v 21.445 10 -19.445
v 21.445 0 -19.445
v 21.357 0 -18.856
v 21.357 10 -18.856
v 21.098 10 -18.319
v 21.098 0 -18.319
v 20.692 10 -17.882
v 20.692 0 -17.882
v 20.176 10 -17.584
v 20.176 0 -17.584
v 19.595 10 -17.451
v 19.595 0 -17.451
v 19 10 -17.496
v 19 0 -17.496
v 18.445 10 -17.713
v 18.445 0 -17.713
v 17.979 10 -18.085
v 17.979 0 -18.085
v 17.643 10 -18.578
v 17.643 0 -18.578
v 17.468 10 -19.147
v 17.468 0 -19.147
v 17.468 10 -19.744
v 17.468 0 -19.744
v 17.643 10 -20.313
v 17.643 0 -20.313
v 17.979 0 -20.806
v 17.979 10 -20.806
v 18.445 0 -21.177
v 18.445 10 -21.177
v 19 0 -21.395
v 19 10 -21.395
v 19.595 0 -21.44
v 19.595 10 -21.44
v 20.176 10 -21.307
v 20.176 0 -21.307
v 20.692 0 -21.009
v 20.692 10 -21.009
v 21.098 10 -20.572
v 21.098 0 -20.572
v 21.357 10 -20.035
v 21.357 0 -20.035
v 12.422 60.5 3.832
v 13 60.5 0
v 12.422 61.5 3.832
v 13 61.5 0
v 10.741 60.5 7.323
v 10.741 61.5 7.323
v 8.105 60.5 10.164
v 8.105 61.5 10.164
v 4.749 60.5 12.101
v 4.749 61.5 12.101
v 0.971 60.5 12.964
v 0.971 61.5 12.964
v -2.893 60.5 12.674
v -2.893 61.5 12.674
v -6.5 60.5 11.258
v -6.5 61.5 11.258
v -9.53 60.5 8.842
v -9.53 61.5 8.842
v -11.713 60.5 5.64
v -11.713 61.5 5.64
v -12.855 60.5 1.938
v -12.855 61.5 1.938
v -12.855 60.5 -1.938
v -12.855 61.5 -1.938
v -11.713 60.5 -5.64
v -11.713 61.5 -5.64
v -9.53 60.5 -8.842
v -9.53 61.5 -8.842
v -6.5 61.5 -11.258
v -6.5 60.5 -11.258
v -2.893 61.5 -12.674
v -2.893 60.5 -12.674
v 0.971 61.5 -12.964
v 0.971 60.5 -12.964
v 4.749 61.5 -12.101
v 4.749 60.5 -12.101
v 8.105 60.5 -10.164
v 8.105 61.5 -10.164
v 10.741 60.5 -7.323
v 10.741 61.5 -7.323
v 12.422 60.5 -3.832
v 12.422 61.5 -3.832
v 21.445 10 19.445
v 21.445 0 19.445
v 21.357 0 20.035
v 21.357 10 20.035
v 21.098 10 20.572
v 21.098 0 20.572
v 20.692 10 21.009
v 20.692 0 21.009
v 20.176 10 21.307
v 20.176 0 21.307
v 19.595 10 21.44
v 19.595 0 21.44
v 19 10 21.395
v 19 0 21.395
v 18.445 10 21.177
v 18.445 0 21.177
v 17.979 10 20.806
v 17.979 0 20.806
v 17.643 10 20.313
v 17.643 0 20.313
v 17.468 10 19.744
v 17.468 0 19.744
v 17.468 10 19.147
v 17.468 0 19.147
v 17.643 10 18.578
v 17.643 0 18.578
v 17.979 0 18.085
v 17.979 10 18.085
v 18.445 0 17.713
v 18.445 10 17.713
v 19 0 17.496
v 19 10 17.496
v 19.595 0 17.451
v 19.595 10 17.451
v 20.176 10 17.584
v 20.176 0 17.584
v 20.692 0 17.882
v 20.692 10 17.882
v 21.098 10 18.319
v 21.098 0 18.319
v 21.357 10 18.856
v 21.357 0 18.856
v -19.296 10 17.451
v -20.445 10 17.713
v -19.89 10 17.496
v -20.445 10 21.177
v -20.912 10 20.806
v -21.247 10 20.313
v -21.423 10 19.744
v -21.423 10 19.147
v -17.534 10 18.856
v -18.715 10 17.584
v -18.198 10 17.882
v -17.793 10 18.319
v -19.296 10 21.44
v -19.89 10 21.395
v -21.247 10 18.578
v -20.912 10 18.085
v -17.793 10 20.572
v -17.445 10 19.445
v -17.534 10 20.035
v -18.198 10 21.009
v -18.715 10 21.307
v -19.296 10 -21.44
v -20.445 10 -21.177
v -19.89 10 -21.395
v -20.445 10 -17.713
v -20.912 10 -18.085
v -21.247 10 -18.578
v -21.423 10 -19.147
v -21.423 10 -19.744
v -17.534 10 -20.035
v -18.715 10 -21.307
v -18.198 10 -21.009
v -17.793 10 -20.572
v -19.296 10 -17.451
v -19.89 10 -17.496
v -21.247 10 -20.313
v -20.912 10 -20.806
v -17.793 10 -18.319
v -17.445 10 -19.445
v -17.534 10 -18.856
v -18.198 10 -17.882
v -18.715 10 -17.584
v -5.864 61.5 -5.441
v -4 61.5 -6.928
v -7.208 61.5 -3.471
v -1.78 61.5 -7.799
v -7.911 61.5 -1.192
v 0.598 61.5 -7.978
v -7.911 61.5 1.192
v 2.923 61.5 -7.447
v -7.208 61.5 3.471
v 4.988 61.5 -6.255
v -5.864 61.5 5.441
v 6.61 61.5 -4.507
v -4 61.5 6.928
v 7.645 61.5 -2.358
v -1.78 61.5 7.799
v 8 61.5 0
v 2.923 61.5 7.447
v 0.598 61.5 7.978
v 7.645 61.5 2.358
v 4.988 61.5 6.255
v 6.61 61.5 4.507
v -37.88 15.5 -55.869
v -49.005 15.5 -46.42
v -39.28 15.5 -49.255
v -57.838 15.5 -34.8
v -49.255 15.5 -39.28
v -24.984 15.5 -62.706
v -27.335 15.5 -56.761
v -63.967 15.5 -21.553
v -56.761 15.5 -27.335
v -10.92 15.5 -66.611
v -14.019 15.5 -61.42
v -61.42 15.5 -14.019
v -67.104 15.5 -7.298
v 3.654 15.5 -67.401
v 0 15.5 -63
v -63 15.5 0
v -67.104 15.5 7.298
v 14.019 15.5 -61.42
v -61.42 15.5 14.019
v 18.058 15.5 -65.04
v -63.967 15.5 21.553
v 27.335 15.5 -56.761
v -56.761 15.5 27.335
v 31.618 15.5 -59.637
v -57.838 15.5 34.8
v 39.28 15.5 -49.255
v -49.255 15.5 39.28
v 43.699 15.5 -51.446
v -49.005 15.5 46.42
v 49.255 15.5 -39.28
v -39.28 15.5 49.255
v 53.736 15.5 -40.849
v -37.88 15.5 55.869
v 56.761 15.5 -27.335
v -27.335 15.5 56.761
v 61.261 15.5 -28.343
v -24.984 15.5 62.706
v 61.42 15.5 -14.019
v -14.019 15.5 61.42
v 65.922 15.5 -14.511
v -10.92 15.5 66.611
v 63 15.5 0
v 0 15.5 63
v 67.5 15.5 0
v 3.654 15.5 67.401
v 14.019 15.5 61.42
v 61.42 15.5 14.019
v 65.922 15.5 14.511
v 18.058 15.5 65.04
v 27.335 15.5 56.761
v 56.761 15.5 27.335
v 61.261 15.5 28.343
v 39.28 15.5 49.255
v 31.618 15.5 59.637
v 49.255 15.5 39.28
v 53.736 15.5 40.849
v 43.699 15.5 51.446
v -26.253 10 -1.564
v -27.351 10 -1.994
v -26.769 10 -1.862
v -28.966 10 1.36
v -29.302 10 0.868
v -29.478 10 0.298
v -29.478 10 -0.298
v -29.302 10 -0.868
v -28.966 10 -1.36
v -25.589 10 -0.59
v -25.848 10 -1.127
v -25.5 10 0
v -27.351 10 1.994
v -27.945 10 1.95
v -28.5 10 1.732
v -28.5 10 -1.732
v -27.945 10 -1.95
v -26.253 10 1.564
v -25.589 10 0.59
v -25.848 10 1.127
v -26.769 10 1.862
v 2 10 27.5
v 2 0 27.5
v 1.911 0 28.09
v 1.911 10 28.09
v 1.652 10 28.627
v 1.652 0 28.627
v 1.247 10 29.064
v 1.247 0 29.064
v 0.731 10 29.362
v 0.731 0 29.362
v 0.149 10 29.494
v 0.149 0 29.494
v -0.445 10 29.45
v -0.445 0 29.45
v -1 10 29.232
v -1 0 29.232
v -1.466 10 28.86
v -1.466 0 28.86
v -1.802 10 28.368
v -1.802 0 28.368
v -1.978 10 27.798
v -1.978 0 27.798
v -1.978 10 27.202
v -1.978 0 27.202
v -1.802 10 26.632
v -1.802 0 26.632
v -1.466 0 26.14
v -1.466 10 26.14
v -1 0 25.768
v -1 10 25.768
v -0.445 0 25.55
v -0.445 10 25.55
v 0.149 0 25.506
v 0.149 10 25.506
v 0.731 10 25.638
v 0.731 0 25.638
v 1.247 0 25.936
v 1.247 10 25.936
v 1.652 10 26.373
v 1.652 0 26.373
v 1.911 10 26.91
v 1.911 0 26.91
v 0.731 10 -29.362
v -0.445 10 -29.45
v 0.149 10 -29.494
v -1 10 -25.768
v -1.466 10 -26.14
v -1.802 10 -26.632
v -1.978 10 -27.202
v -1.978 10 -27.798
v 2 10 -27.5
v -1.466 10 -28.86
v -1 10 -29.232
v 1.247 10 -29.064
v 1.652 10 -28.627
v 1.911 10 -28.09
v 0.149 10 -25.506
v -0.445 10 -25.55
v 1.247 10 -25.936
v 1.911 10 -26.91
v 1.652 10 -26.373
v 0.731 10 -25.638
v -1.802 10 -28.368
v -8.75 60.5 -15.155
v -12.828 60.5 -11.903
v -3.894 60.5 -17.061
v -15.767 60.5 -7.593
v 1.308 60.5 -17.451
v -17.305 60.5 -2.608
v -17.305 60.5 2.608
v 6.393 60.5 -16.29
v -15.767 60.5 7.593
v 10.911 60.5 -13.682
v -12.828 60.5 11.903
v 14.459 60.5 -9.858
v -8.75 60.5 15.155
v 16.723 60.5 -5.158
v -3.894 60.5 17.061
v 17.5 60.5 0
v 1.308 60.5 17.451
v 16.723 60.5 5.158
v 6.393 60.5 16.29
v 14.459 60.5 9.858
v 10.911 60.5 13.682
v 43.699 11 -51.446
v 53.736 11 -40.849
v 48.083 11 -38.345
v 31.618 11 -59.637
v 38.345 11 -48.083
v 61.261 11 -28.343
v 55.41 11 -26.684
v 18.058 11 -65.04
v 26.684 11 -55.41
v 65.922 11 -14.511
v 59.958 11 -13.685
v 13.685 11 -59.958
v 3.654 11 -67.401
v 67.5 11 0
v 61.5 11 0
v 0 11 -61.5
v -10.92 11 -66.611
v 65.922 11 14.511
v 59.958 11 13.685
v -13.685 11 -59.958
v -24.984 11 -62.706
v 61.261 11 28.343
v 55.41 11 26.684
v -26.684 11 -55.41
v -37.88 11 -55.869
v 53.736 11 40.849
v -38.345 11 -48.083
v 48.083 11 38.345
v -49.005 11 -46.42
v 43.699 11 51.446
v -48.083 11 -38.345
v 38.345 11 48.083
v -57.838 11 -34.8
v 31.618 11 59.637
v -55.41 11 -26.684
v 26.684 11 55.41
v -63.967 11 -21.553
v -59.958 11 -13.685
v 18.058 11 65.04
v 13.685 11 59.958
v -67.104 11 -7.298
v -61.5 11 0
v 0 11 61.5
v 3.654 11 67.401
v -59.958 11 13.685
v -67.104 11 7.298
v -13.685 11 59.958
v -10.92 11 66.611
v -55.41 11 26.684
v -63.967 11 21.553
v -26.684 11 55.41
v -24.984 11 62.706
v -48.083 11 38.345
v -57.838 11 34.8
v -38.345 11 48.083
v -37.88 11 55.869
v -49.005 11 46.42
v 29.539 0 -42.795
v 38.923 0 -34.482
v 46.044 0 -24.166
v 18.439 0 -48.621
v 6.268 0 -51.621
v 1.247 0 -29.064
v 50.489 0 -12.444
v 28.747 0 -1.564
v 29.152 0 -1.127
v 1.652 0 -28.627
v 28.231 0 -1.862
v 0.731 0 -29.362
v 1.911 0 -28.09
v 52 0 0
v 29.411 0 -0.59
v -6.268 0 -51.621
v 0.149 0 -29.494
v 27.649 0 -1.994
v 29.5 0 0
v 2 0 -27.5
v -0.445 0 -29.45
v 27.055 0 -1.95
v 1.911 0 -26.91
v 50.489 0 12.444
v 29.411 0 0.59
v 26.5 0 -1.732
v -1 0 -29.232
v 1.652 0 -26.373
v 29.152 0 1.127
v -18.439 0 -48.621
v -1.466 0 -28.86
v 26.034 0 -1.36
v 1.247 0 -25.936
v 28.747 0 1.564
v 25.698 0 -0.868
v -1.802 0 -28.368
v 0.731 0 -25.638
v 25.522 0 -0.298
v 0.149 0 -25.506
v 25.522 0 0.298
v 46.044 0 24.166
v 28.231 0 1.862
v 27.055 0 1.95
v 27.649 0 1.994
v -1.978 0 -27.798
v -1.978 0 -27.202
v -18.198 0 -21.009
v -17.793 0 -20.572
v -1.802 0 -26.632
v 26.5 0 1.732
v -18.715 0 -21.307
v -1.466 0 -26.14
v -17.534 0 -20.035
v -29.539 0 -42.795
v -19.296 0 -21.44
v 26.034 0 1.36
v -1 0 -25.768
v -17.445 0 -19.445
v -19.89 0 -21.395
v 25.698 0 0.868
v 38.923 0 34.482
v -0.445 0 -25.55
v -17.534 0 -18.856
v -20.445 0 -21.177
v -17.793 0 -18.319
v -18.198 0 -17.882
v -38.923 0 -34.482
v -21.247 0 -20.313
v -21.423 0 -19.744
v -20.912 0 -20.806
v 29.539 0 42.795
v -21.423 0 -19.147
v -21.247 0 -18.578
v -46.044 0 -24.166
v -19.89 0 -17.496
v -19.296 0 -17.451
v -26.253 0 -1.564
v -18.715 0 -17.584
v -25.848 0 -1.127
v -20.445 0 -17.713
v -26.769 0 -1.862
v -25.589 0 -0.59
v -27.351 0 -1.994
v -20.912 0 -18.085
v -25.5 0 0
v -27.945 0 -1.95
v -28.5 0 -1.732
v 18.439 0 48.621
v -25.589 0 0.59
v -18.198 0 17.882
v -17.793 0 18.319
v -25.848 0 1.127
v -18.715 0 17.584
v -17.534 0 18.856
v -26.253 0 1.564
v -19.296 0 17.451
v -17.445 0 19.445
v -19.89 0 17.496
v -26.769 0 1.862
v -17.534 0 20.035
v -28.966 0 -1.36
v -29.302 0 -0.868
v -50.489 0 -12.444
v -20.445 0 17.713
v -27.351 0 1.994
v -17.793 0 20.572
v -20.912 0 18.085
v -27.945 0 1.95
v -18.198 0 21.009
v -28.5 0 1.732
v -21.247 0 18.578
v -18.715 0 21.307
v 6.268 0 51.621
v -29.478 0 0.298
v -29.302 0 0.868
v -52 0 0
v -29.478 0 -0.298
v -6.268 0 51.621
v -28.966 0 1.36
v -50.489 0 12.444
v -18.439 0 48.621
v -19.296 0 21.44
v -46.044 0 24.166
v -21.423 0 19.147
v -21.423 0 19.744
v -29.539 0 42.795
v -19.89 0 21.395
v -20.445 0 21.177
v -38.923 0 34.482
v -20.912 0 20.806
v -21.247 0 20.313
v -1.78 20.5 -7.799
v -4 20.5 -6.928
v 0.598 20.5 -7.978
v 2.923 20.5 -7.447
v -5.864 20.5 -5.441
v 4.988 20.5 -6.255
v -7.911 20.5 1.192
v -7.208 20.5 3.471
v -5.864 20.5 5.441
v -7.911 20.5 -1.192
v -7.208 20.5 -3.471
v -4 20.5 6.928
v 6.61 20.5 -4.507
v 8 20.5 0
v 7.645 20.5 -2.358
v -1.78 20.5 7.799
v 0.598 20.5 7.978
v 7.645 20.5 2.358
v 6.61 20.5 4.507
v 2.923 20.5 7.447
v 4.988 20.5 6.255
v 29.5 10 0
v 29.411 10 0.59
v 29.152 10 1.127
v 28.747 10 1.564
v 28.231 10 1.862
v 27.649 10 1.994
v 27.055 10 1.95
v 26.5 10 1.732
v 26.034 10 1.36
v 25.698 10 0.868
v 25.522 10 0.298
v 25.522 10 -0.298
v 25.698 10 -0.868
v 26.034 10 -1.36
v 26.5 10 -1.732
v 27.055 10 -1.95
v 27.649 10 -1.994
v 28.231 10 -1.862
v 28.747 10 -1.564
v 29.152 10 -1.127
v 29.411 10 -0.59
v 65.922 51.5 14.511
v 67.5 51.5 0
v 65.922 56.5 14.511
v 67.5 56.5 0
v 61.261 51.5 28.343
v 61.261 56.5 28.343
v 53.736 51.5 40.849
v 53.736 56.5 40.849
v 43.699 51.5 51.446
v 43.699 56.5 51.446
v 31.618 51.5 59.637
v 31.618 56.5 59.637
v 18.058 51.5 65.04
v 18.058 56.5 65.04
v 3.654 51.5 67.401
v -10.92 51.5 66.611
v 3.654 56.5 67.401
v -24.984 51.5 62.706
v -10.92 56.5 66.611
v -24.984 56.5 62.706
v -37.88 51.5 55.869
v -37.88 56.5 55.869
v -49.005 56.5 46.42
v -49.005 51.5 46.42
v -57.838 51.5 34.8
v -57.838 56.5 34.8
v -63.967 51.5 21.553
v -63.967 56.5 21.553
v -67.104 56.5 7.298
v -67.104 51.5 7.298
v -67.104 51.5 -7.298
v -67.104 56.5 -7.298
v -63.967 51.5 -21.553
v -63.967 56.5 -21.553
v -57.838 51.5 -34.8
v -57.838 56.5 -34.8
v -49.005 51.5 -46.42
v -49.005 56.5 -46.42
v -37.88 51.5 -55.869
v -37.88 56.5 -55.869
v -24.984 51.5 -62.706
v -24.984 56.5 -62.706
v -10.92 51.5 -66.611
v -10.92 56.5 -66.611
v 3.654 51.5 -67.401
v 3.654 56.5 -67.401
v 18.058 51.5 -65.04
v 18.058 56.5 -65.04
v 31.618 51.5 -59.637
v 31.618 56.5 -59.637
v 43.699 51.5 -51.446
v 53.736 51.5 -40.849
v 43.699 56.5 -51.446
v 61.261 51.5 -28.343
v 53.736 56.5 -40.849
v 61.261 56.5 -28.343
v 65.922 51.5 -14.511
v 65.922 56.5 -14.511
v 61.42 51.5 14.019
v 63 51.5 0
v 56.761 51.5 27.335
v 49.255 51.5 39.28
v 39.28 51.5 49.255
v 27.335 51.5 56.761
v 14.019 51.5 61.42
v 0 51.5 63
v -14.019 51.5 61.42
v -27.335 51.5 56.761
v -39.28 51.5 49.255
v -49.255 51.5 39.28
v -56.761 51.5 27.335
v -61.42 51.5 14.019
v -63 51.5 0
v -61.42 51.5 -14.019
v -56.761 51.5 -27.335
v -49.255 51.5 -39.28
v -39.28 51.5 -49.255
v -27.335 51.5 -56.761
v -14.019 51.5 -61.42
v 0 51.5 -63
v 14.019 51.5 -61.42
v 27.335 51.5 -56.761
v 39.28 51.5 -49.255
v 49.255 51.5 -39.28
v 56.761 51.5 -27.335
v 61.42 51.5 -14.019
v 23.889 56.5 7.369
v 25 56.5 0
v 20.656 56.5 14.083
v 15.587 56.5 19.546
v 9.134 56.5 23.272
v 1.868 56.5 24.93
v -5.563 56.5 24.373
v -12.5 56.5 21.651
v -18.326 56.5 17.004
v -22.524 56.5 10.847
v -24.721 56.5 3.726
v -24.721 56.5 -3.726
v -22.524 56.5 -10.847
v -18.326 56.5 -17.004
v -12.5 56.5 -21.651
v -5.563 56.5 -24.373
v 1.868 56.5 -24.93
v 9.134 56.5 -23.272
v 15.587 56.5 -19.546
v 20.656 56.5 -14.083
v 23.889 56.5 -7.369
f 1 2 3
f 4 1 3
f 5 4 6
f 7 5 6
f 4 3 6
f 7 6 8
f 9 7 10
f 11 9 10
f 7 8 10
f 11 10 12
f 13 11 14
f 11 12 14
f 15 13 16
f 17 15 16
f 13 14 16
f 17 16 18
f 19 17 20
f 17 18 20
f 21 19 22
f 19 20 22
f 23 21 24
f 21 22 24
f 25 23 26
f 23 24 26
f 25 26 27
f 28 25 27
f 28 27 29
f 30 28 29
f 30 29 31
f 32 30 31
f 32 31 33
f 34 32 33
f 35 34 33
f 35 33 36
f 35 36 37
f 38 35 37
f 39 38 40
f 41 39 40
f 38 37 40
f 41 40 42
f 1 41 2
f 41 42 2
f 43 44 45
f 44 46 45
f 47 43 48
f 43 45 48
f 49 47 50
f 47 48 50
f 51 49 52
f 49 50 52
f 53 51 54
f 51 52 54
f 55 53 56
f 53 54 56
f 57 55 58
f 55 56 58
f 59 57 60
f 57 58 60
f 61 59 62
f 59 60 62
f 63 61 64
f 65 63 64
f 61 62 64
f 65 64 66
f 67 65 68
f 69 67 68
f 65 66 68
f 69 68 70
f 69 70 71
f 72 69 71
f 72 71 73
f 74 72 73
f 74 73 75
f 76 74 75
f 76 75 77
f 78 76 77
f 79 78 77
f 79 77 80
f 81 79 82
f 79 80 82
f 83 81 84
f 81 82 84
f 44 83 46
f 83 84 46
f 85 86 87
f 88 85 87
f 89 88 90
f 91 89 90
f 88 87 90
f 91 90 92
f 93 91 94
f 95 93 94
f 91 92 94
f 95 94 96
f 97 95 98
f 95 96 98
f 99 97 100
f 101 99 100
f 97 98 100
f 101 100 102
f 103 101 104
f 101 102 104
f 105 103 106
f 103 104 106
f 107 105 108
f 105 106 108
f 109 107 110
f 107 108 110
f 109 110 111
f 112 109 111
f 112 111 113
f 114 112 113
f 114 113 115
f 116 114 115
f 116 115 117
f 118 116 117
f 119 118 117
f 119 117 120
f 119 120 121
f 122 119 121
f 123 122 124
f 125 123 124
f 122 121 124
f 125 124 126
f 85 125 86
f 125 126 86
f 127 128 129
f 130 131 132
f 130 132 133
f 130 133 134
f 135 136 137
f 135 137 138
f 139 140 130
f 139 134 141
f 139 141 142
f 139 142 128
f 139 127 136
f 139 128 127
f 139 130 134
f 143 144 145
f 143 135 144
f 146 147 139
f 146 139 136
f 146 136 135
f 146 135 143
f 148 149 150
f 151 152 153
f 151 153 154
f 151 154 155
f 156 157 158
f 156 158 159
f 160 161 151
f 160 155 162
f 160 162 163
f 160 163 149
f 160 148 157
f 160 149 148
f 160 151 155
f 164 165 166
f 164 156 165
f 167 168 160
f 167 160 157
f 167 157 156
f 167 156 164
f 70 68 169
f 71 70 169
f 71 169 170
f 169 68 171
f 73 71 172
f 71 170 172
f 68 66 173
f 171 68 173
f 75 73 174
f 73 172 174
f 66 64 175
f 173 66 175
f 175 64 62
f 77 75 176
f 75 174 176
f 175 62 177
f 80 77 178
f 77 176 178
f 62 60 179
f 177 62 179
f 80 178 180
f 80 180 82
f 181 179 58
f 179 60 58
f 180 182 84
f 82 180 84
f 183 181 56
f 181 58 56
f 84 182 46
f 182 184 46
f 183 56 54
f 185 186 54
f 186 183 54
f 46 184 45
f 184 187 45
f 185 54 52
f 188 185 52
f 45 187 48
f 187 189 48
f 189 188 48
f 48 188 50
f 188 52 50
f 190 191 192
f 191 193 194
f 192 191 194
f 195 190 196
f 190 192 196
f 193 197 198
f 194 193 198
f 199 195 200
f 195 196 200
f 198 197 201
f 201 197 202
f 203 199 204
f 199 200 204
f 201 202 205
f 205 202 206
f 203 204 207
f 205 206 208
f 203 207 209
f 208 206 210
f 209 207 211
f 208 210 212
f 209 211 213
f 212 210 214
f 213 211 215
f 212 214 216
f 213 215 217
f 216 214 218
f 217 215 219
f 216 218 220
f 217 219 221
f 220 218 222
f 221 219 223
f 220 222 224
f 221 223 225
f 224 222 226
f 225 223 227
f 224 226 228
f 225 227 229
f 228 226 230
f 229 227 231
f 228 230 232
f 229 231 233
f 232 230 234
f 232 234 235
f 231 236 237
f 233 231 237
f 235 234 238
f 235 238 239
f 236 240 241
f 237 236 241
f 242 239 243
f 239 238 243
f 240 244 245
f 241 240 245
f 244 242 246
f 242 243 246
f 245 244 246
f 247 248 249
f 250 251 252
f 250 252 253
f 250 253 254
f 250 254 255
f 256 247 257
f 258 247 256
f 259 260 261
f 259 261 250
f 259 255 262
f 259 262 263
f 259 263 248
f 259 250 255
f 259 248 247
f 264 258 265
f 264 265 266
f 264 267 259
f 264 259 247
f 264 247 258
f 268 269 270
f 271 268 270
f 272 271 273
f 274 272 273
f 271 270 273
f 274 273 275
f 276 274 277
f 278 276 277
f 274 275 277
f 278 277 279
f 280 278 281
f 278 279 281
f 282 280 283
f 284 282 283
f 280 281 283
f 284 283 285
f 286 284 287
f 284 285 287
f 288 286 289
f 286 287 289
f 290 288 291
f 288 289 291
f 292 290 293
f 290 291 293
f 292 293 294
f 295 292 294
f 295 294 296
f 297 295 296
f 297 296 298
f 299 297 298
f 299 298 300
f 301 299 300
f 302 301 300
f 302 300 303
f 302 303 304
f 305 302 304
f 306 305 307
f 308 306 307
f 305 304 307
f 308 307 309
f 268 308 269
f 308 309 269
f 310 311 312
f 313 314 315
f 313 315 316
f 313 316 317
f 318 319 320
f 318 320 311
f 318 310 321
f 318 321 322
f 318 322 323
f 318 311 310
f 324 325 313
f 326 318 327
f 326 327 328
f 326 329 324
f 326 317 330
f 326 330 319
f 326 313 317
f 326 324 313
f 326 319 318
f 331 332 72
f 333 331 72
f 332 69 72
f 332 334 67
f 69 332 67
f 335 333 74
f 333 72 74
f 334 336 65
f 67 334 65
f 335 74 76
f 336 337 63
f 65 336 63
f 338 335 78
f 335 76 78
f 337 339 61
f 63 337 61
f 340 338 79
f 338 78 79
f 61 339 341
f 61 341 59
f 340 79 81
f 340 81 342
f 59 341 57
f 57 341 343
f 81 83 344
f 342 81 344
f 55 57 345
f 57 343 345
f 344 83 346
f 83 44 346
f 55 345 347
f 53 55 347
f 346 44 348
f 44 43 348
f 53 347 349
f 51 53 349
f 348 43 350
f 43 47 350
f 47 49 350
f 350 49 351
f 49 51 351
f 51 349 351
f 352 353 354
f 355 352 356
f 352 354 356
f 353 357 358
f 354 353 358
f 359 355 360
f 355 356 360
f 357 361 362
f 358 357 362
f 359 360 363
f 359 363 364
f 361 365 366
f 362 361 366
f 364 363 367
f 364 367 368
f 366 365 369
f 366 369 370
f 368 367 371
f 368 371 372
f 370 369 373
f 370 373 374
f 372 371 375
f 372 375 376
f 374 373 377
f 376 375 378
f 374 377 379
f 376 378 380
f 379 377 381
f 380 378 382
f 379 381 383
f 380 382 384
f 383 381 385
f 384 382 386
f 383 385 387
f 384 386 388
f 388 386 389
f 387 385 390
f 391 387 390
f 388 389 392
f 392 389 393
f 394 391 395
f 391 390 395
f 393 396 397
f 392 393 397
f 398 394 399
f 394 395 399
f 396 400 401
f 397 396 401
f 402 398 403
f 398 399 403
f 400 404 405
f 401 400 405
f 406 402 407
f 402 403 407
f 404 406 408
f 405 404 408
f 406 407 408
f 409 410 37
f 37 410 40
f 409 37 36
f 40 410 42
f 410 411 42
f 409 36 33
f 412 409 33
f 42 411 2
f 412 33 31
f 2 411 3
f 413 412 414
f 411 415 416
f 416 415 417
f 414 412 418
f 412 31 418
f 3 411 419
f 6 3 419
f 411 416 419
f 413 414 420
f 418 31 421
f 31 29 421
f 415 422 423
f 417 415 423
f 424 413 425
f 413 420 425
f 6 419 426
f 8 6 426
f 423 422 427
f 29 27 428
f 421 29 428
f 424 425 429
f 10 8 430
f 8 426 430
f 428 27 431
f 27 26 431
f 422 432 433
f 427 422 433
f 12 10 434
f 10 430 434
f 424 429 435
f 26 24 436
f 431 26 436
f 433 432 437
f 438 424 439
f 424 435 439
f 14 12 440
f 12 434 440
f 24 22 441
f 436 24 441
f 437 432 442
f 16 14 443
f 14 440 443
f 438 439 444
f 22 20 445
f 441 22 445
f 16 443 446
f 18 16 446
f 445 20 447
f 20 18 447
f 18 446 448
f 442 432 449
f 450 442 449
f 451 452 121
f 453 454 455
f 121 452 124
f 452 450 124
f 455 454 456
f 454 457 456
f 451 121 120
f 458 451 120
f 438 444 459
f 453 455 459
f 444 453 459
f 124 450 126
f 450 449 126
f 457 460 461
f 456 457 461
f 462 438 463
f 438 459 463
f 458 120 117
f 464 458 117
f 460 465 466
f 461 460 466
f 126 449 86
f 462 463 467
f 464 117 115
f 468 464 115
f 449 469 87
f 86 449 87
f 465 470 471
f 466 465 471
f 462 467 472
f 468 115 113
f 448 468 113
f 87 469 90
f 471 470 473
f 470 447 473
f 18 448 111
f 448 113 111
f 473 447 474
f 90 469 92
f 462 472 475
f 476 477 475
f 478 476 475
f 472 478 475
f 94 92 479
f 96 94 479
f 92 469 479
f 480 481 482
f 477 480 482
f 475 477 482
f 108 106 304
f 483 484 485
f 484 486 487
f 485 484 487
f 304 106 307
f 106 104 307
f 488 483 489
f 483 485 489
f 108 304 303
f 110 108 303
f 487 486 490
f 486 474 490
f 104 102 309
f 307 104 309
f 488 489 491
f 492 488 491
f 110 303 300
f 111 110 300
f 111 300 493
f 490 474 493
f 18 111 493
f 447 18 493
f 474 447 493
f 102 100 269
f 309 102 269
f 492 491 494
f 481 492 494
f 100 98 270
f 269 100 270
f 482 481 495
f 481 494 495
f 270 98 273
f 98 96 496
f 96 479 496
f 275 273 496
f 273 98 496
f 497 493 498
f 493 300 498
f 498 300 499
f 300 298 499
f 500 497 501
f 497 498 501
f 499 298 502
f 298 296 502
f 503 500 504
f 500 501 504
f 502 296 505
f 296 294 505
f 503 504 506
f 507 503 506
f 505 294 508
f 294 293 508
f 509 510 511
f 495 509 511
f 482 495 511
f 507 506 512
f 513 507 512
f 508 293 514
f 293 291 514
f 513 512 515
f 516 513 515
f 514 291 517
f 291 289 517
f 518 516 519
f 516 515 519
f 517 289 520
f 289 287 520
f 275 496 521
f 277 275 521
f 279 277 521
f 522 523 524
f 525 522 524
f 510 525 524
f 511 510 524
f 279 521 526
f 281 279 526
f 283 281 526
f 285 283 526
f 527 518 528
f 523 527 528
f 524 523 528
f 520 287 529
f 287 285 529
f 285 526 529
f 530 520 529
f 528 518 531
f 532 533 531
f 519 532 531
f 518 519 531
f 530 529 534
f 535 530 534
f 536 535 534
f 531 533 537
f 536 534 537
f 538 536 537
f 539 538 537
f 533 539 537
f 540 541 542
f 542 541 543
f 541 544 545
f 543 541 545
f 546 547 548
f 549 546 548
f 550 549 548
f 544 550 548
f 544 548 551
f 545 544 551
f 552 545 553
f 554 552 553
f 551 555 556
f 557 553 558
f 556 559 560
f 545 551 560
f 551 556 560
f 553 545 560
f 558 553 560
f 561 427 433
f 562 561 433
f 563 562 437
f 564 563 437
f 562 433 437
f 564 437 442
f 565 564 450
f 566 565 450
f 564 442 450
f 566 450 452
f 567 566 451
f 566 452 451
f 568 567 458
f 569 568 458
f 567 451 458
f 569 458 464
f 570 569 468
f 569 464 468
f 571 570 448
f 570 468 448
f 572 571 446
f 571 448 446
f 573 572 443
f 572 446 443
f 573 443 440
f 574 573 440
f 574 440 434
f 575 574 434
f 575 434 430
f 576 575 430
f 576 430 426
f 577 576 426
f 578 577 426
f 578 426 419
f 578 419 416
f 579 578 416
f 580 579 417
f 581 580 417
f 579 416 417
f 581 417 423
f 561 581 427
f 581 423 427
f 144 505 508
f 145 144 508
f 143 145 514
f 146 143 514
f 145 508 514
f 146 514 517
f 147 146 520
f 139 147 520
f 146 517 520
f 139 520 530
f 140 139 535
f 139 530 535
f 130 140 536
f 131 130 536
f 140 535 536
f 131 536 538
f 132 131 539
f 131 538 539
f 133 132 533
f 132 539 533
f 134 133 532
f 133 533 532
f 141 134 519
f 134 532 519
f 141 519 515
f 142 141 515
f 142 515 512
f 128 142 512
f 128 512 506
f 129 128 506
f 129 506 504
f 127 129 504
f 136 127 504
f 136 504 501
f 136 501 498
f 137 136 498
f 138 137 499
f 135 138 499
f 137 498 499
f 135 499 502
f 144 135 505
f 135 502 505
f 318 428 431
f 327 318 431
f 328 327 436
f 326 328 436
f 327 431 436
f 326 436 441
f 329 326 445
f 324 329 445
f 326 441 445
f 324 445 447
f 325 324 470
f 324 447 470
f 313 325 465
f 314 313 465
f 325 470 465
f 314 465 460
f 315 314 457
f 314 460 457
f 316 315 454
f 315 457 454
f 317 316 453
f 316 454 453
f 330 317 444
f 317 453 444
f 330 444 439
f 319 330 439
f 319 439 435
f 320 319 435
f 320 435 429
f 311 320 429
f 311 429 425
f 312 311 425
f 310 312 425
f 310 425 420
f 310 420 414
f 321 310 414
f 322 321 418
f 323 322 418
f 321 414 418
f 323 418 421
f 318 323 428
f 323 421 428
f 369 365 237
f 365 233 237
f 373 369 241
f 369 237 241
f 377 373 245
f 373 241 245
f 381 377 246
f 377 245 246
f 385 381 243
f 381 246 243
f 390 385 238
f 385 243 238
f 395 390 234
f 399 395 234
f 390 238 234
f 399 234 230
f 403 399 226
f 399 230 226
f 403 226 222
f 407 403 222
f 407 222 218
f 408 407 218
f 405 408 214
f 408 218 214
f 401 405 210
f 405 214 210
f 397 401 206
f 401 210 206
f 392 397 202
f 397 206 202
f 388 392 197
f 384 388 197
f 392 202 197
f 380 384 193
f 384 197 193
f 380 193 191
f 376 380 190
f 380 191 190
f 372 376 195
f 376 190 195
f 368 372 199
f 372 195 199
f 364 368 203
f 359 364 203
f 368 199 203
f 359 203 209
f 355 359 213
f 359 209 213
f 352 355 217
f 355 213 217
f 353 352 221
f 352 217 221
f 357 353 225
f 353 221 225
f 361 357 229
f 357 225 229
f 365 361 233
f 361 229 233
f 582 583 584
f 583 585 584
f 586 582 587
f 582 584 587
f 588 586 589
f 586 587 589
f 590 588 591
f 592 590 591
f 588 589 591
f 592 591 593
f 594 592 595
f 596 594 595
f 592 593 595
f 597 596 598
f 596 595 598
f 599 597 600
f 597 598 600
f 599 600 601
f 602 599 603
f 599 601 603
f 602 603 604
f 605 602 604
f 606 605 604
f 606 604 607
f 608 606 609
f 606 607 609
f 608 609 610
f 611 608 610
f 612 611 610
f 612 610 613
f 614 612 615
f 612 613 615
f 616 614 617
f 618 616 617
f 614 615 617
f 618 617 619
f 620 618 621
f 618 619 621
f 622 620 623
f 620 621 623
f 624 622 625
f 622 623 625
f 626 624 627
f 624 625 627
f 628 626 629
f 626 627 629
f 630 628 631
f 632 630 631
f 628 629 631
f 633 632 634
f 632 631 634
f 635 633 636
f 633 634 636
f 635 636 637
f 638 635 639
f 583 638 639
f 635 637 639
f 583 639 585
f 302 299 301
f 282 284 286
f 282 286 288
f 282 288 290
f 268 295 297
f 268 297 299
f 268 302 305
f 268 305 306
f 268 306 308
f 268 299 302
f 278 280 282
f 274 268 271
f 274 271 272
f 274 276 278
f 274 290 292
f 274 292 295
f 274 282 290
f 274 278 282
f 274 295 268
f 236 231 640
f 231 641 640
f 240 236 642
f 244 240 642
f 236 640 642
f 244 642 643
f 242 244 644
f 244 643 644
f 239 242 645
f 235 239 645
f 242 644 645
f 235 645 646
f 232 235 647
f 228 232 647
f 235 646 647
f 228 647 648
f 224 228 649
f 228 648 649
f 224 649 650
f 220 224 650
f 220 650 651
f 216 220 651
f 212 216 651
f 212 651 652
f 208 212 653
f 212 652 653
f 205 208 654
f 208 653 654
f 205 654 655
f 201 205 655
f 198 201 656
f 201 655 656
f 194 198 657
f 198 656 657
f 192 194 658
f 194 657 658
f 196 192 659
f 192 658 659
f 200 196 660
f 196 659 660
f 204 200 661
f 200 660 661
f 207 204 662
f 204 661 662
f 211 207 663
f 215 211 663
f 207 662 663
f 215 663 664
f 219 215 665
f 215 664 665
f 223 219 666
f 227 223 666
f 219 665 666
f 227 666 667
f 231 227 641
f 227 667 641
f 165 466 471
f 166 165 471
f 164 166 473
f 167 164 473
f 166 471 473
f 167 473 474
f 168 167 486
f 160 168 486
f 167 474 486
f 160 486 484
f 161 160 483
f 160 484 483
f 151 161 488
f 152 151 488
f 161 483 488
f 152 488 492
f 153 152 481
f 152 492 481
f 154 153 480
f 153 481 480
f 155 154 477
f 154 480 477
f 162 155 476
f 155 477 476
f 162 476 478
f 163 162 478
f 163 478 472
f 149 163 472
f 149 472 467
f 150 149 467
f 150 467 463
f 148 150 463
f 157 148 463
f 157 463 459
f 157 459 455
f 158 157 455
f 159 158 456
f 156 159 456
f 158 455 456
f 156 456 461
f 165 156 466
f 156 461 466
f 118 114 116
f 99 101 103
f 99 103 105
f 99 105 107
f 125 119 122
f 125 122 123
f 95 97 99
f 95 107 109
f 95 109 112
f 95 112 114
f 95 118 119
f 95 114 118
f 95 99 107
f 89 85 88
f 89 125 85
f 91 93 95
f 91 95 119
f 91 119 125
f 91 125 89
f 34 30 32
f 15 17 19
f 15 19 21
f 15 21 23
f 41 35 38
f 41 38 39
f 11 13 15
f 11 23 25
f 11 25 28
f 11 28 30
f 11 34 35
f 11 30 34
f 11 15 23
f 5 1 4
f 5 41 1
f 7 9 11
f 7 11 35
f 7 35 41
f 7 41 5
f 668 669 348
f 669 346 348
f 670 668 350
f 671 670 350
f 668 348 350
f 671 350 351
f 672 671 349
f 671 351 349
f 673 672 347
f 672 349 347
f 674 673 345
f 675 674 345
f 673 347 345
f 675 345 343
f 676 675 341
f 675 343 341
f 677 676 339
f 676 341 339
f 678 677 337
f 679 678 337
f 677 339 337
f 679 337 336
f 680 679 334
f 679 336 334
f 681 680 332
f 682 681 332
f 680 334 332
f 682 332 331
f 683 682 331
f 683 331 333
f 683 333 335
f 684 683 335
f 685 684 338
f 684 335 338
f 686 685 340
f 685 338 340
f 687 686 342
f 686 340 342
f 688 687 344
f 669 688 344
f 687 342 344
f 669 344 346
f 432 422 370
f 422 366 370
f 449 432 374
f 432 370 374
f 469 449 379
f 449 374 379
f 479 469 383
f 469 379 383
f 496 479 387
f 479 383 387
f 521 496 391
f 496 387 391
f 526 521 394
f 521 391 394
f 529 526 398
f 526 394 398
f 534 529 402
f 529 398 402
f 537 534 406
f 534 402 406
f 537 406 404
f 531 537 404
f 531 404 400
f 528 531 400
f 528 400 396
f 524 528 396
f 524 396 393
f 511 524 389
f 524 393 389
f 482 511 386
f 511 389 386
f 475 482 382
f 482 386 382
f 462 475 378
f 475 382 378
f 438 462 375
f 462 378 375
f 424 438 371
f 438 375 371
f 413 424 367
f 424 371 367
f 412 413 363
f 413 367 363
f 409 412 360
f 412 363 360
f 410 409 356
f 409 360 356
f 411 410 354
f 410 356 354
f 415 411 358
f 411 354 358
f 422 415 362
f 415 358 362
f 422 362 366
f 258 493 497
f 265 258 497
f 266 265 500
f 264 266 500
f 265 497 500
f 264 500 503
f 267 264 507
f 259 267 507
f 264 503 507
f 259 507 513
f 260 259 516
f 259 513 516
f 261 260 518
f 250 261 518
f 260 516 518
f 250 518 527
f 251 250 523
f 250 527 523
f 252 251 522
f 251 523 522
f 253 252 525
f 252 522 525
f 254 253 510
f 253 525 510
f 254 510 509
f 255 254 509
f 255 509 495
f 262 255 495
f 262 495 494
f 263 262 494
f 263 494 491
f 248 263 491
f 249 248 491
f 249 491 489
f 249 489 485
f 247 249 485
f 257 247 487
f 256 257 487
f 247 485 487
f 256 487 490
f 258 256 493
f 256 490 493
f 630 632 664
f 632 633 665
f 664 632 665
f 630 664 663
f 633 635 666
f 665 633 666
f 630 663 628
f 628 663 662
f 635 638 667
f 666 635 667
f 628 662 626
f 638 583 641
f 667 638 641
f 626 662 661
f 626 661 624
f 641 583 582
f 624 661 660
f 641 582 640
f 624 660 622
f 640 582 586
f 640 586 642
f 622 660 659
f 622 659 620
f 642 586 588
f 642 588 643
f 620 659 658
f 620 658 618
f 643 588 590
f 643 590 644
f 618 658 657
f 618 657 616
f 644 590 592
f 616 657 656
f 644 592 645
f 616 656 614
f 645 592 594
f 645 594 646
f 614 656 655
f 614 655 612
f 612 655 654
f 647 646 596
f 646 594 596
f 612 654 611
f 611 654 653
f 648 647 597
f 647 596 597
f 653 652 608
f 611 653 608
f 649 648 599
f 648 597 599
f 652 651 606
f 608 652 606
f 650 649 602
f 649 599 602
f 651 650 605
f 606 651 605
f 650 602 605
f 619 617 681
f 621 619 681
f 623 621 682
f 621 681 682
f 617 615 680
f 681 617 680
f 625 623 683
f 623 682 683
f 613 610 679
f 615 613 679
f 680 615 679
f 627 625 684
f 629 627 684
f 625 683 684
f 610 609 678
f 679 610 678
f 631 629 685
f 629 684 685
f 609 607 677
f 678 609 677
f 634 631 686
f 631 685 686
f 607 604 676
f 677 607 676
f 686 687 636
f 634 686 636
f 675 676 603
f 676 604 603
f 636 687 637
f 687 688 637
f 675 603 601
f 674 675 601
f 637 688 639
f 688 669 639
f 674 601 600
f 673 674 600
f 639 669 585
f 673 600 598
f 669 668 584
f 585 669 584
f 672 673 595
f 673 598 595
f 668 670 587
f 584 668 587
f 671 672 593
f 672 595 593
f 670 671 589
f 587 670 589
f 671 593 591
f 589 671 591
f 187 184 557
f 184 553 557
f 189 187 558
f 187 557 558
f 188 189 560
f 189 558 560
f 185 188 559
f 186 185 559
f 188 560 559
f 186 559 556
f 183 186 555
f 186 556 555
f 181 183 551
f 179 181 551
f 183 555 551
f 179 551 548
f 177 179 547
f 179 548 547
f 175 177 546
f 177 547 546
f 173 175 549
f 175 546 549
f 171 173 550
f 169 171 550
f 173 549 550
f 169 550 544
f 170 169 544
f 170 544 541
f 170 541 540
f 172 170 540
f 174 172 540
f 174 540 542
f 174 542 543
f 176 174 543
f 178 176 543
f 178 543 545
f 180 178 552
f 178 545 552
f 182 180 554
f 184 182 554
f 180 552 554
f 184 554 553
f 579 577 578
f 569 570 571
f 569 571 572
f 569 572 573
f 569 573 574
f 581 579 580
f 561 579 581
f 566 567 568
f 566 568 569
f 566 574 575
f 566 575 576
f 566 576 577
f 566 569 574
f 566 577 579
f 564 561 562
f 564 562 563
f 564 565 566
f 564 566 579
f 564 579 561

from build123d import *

# Parameters (mm, degrees)
SKETCH2_R          = 2
CUT_EXTRUDE1_DEPTH = 10


with BuildPart() as part:
    # Sketch1 → Revolve1 (revolve)
    with BuildSketch(Plane.XY):
        Polygon((17.5, 60.5), (13, 60.5), (13, 61.5), (8, 61.5), (8, 20.5), (0, 20.5), (0, 0), (52, 0), (61.5, 11), (67.5, 11), (67.5, 15.5), (63, 15.5), (63, 51.5), (67.5, 51.5), (67.5, 56.5), (25, 56.5), align=None)
    revolve(axis=Axis((0, 20.5, 0), (0, -1, 0)))

    # Sketch2 → Cut-Extrude1 (cut)
    with BuildSketch(Plane.XZ):
        with Locations((0, 27.5)):
            Circle(SKETCH2_R)
        with Locations((19.445436483, 19.445436483)):
            Circle(SKETCH2_R)
        with Locations((27.5, 0)):
            Circle(SKETCH2_R)
        with Locations((19.445436483, -19.445436483)):
            Circle(SKETCH2_R)
        with Locations((0, -27.5)):
            Circle(SKETCH2_R)
        with Locations((-19.445436483, -19.445436483)):
            Circle(SKETCH2_R)
        with Locations((-27.5, 0)):
            Circle(SKETCH2_R)
        with Locations((-19.445436483, 19.445436483)):
            Circle(SKETCH2_R)
    extrude(amount=-CUT_EXTRUDE1_DEPTH, mode=Mode.SUBTRACT)


solid = part.part
